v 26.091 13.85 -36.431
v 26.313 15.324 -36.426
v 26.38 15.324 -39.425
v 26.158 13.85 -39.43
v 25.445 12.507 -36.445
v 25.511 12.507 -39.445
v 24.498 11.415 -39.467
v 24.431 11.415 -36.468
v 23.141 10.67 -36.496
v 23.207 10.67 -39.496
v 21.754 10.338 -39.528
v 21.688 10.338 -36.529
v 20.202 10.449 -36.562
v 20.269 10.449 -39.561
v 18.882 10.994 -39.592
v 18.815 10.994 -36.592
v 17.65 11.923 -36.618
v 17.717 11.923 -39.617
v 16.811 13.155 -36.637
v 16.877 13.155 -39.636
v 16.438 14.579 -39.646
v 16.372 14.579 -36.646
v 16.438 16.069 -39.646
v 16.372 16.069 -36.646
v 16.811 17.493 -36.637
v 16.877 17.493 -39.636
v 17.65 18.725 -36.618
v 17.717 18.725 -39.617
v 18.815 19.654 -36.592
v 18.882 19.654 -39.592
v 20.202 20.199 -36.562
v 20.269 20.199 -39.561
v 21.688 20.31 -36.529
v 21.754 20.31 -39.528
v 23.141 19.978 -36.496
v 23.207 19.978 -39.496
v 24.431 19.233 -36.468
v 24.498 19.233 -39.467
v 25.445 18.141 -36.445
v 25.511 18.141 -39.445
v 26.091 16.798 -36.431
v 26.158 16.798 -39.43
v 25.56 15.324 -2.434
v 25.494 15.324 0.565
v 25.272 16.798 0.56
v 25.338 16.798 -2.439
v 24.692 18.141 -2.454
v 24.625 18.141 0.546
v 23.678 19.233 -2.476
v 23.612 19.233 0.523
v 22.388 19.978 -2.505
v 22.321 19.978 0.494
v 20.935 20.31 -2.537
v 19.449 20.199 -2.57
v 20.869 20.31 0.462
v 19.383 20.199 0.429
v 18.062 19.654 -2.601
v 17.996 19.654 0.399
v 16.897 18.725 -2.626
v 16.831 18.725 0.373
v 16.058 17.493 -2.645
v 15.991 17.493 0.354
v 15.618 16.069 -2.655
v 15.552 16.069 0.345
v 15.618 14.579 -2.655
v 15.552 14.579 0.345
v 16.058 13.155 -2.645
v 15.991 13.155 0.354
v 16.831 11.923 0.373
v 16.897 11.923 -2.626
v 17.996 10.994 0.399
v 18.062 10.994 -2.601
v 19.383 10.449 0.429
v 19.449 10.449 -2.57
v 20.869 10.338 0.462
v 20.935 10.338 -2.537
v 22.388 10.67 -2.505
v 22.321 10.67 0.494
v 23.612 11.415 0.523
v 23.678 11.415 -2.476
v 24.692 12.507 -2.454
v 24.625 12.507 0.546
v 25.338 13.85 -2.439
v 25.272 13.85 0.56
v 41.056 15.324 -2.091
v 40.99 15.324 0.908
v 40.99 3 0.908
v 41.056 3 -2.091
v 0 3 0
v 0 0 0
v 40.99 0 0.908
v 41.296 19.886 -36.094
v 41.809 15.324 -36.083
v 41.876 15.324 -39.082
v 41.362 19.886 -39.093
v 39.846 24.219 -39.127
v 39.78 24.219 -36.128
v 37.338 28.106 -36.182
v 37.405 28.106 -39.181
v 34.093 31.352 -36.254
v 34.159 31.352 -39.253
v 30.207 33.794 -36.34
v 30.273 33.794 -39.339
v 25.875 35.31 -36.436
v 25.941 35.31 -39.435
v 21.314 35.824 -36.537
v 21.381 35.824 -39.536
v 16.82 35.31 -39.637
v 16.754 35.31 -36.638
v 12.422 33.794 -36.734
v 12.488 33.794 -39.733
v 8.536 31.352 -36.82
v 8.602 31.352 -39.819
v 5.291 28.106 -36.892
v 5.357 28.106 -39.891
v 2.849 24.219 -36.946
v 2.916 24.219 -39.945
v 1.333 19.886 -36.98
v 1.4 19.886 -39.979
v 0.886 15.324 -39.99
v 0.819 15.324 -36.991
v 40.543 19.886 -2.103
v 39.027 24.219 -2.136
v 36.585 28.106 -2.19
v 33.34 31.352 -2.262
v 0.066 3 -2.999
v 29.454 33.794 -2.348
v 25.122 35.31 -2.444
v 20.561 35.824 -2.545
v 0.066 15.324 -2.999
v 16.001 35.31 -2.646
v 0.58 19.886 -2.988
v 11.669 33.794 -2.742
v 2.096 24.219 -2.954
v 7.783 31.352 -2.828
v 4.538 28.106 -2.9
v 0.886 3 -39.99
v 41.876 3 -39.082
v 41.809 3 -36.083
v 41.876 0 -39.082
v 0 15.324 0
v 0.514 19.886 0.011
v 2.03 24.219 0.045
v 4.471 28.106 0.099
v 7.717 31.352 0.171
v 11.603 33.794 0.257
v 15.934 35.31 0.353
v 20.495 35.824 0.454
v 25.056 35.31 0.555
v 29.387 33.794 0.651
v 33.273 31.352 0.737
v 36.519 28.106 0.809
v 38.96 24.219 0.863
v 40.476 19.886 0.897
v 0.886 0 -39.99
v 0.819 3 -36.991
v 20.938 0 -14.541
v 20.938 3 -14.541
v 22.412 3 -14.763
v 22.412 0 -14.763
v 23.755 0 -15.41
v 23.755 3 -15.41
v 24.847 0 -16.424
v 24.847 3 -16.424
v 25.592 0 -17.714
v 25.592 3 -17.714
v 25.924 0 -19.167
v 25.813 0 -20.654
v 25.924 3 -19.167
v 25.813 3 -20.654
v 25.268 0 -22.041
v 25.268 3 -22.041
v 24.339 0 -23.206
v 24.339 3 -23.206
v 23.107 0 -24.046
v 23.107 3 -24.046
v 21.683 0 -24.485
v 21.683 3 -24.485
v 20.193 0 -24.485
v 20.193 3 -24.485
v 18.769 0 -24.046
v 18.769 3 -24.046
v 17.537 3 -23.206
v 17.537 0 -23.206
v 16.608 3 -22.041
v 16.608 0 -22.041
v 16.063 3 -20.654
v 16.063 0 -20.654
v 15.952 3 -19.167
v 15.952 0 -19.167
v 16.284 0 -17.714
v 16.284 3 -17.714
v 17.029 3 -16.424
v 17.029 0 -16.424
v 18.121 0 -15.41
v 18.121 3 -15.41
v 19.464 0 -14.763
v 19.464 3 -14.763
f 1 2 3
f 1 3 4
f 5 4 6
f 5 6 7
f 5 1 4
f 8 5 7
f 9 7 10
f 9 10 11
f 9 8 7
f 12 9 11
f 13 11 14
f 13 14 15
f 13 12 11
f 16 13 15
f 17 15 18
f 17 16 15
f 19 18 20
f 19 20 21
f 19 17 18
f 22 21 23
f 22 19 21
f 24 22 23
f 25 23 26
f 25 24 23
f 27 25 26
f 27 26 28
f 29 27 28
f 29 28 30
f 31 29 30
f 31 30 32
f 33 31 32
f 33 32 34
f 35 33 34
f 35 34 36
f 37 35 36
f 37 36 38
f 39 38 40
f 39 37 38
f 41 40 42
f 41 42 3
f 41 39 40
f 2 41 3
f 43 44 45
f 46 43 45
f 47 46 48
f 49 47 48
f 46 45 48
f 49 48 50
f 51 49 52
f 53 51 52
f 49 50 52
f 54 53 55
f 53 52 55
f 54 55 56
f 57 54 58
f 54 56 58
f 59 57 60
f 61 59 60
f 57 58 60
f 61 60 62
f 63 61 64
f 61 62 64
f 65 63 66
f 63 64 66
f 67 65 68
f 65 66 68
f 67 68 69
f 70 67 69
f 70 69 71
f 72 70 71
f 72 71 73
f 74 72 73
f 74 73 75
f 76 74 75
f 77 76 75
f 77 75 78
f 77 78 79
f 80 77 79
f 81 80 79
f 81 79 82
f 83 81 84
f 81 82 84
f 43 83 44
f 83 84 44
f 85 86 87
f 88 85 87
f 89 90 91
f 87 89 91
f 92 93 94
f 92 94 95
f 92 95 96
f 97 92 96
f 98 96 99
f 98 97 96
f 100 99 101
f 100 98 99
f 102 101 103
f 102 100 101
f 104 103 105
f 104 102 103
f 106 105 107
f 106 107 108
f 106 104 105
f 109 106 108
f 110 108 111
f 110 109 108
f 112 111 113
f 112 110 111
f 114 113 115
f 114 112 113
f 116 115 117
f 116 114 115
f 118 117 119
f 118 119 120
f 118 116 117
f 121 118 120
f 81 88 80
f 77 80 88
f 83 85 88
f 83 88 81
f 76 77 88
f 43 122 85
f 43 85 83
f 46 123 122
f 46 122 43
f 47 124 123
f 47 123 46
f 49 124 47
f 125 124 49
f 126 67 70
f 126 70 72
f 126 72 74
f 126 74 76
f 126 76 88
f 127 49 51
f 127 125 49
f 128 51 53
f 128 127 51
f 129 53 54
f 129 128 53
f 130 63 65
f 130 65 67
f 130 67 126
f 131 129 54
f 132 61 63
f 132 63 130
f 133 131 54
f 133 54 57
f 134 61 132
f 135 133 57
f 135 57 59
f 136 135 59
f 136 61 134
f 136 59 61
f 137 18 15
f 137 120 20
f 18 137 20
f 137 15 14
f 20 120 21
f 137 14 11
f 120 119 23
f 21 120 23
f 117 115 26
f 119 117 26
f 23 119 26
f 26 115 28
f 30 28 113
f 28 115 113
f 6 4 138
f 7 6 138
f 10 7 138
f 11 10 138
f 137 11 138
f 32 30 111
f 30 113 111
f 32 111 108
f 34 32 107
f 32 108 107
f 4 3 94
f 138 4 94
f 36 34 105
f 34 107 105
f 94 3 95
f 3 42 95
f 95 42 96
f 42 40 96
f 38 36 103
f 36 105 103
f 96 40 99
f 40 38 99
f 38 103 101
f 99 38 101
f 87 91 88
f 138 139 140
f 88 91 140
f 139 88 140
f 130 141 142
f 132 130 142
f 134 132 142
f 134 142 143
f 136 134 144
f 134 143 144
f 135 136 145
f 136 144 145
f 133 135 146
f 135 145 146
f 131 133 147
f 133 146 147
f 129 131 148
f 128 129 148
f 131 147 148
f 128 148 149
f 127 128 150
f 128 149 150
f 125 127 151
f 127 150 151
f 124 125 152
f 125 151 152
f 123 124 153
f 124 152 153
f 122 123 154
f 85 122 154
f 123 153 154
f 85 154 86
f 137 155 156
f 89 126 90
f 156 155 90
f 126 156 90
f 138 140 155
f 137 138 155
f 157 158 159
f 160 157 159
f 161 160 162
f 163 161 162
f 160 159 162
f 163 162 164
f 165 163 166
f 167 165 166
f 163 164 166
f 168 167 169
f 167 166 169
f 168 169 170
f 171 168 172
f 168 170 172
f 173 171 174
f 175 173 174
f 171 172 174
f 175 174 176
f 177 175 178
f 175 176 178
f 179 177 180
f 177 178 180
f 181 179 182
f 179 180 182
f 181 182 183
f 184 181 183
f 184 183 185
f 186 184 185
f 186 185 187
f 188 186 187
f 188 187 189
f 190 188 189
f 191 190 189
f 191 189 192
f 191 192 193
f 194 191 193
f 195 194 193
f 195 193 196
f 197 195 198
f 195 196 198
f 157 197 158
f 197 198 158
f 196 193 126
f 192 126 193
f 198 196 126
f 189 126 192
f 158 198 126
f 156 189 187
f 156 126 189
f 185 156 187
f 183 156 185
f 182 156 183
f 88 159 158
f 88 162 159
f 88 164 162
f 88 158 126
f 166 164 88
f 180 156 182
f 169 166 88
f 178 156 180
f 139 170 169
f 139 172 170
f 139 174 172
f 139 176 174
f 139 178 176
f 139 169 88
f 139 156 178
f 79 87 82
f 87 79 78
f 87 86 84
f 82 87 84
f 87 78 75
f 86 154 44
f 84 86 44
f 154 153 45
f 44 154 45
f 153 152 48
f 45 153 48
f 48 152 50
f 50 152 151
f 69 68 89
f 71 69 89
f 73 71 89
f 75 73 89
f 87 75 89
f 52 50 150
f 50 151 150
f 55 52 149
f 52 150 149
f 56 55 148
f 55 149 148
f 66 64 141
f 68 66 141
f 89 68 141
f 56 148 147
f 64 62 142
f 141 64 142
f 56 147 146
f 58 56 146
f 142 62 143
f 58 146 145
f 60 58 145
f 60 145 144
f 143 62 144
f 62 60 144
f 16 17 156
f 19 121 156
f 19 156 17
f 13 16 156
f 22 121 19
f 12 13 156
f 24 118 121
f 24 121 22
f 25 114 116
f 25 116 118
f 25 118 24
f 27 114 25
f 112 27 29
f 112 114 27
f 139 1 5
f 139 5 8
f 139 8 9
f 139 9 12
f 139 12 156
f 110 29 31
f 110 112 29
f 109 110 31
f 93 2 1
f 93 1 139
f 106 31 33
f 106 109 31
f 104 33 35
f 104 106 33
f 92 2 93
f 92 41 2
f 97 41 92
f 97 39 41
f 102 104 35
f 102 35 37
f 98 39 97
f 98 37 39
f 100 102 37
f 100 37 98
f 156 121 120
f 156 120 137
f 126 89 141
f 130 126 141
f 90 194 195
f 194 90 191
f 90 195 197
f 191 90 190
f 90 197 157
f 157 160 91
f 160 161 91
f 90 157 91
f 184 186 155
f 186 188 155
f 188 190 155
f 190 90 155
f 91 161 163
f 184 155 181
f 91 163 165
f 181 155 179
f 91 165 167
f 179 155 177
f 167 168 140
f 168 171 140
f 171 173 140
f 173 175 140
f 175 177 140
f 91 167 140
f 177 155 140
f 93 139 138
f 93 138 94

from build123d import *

# Parameters (mm, degrees)
BOSS_EXTRUDE1_DEPTH = 3
SKETCH2_R           = 5
CUT_EXTRUDE1_DEPTH  = 3
SKETCH4_R           = 5
BOSS_EXTRUDE2_DEPTH = 3
BOSS_EXTRUDE3_START = -3
SKETCH5_R           = 5
BOSS_EXTRUDE3_DEPTH = 3


with BuildPart() as part:
    # Sketch1 → Boss-Extrude1 (new body)
    with BuildSketch(Plane(origin=(0, 0, 0), x_dir=(1, 0, 0), z_dir=(0, 1, 0))):
        Polygon((0, 0), (40.989942652, -0.908075633), (41.875870099, 39.082112321), (0.885927446, 39.990187954), align=None)
    extrude(amount=BOSS_EXTRUDE1_DEPTH)

    # Sketch2 → Cut-Extrude1 (cut)
    with BuildSketch(Plane(origin=(0, 3, 0), x_dir=(1, 0, 0), z_dir=(0, 1, 0))):
        with Locations(Location((20.937935049, 19.54105616, 0), (0, 0, 270))):
            Circle(SKETCH2_R)
    extrude(amount=-CUT_EXTRUDE1_DEPTH, mode=Mode.SUBTRACT)

    # Sketch4 → Boss-Extrude2 (add)
    with BuildSketch(Plane(origin=(0, 0, 0), x_dir=(0.9997546988385365, 0, 0.022148186162014694), z_dir=(-0.02214818616201469, 0, 0.9997546988385364))):
        with BuildLine():
            Line((41, 15.324050928), (41, 3))
            Line((41, 3), (0, 3))
            Line((0, 3), (0, 15.324050928))
            ThreePointArc((0, 15.324050928), (20.5, 35.824050928), (41, 15.324050928))
        make_face()
        with Locations((20.5, 15.324050928)):
            Circle(SKETCH4_R, mode=Mode.SUBTRACT)
    extrude(amount=-BOSS_EXTRUDE2_DEPTH)

    # Sketch5 → Boss-Extrude3 (add)
    with BuildSketch(Plane(origin=(0.885927446, 0, -39.990187954), x_dir=(-0.9997546988385365, 0, -0.022148186162014458), z_dir=(0.022148186162014454, 0, -0.9997546988385364)).offset(BOSS_EXTRUDE3_START)):
        with BuildLine():
            Line((-41, 3), (-41, 15.324050928))
            ThreePointArc((-41, 15.324050928), (-20.5, 35.824050928), (0, 15.324050928))
            Line((0, 15.324050928), (0, 3))
            Line((0, 3), (-41, 3))
        make_face()
        with Locations(Location((-20.5, 15.324050928, 0), (0, 0, 180))):
            Circle(SKETCH5_R, mode=Mode.SUBTRACT)
    extrude(amount=BOSS_EXTRUDE3_DEPTH)


solid = part.part
